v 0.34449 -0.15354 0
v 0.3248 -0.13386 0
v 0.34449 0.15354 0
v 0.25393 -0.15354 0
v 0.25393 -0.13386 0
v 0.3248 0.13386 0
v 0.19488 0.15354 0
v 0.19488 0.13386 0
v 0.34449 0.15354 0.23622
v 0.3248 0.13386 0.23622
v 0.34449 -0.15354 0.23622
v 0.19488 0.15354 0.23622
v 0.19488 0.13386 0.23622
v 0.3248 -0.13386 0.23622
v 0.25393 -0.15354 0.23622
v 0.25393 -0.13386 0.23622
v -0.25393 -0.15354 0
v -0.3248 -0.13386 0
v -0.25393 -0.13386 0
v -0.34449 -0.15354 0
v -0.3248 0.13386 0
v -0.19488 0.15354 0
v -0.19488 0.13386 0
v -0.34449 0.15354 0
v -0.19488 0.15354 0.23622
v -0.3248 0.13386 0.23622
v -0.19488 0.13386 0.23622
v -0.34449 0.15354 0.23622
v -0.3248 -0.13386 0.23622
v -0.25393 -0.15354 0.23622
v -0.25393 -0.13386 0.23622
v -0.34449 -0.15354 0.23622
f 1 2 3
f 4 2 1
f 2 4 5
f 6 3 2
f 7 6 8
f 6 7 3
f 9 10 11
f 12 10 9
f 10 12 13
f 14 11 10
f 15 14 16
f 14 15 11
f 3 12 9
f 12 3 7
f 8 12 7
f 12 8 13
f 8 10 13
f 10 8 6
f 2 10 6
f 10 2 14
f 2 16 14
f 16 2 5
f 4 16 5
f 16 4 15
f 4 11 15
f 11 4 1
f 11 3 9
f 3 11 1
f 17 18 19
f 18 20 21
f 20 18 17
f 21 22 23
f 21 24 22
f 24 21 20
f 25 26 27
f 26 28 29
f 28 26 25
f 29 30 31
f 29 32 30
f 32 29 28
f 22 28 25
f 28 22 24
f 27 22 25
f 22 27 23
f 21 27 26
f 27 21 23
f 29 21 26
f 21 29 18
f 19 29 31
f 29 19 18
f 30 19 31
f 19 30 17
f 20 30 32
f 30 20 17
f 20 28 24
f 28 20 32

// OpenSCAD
// file: defines.scad
Wb = 1.65;
Hb = 0.68;
H =  1.15;
Wf = 1.20;
Fo = 0.10;

scale = 1/2.54;
// main file
include <defines.scad>

module Pin()
{
  linear_extrude(height = 0.60, center = false)
    polygon([
      [ Wb/2 - 0.33,  Hb/2],
      [ Wb/2 - 0.33,  Hb/2 + Ph],
      [ Wb/2 + Ph,  Hb/2 + Ph],
      [ Wb/2 + Ph, -Hb/2 - Ph],
      [ Wb/2 - 0.18, -Hb/2 - Ph],
      [ Wb/2 - 0.18, -Hb/2],
      [ Wb/2, -Hb/2],
      [ Wb/2,  Hb/2]
    ]);
}

Ph = 0.05;


scale(scale) color("Gold") {
  Pin();
  mirror([1, 0, 0]) Pin();

}
